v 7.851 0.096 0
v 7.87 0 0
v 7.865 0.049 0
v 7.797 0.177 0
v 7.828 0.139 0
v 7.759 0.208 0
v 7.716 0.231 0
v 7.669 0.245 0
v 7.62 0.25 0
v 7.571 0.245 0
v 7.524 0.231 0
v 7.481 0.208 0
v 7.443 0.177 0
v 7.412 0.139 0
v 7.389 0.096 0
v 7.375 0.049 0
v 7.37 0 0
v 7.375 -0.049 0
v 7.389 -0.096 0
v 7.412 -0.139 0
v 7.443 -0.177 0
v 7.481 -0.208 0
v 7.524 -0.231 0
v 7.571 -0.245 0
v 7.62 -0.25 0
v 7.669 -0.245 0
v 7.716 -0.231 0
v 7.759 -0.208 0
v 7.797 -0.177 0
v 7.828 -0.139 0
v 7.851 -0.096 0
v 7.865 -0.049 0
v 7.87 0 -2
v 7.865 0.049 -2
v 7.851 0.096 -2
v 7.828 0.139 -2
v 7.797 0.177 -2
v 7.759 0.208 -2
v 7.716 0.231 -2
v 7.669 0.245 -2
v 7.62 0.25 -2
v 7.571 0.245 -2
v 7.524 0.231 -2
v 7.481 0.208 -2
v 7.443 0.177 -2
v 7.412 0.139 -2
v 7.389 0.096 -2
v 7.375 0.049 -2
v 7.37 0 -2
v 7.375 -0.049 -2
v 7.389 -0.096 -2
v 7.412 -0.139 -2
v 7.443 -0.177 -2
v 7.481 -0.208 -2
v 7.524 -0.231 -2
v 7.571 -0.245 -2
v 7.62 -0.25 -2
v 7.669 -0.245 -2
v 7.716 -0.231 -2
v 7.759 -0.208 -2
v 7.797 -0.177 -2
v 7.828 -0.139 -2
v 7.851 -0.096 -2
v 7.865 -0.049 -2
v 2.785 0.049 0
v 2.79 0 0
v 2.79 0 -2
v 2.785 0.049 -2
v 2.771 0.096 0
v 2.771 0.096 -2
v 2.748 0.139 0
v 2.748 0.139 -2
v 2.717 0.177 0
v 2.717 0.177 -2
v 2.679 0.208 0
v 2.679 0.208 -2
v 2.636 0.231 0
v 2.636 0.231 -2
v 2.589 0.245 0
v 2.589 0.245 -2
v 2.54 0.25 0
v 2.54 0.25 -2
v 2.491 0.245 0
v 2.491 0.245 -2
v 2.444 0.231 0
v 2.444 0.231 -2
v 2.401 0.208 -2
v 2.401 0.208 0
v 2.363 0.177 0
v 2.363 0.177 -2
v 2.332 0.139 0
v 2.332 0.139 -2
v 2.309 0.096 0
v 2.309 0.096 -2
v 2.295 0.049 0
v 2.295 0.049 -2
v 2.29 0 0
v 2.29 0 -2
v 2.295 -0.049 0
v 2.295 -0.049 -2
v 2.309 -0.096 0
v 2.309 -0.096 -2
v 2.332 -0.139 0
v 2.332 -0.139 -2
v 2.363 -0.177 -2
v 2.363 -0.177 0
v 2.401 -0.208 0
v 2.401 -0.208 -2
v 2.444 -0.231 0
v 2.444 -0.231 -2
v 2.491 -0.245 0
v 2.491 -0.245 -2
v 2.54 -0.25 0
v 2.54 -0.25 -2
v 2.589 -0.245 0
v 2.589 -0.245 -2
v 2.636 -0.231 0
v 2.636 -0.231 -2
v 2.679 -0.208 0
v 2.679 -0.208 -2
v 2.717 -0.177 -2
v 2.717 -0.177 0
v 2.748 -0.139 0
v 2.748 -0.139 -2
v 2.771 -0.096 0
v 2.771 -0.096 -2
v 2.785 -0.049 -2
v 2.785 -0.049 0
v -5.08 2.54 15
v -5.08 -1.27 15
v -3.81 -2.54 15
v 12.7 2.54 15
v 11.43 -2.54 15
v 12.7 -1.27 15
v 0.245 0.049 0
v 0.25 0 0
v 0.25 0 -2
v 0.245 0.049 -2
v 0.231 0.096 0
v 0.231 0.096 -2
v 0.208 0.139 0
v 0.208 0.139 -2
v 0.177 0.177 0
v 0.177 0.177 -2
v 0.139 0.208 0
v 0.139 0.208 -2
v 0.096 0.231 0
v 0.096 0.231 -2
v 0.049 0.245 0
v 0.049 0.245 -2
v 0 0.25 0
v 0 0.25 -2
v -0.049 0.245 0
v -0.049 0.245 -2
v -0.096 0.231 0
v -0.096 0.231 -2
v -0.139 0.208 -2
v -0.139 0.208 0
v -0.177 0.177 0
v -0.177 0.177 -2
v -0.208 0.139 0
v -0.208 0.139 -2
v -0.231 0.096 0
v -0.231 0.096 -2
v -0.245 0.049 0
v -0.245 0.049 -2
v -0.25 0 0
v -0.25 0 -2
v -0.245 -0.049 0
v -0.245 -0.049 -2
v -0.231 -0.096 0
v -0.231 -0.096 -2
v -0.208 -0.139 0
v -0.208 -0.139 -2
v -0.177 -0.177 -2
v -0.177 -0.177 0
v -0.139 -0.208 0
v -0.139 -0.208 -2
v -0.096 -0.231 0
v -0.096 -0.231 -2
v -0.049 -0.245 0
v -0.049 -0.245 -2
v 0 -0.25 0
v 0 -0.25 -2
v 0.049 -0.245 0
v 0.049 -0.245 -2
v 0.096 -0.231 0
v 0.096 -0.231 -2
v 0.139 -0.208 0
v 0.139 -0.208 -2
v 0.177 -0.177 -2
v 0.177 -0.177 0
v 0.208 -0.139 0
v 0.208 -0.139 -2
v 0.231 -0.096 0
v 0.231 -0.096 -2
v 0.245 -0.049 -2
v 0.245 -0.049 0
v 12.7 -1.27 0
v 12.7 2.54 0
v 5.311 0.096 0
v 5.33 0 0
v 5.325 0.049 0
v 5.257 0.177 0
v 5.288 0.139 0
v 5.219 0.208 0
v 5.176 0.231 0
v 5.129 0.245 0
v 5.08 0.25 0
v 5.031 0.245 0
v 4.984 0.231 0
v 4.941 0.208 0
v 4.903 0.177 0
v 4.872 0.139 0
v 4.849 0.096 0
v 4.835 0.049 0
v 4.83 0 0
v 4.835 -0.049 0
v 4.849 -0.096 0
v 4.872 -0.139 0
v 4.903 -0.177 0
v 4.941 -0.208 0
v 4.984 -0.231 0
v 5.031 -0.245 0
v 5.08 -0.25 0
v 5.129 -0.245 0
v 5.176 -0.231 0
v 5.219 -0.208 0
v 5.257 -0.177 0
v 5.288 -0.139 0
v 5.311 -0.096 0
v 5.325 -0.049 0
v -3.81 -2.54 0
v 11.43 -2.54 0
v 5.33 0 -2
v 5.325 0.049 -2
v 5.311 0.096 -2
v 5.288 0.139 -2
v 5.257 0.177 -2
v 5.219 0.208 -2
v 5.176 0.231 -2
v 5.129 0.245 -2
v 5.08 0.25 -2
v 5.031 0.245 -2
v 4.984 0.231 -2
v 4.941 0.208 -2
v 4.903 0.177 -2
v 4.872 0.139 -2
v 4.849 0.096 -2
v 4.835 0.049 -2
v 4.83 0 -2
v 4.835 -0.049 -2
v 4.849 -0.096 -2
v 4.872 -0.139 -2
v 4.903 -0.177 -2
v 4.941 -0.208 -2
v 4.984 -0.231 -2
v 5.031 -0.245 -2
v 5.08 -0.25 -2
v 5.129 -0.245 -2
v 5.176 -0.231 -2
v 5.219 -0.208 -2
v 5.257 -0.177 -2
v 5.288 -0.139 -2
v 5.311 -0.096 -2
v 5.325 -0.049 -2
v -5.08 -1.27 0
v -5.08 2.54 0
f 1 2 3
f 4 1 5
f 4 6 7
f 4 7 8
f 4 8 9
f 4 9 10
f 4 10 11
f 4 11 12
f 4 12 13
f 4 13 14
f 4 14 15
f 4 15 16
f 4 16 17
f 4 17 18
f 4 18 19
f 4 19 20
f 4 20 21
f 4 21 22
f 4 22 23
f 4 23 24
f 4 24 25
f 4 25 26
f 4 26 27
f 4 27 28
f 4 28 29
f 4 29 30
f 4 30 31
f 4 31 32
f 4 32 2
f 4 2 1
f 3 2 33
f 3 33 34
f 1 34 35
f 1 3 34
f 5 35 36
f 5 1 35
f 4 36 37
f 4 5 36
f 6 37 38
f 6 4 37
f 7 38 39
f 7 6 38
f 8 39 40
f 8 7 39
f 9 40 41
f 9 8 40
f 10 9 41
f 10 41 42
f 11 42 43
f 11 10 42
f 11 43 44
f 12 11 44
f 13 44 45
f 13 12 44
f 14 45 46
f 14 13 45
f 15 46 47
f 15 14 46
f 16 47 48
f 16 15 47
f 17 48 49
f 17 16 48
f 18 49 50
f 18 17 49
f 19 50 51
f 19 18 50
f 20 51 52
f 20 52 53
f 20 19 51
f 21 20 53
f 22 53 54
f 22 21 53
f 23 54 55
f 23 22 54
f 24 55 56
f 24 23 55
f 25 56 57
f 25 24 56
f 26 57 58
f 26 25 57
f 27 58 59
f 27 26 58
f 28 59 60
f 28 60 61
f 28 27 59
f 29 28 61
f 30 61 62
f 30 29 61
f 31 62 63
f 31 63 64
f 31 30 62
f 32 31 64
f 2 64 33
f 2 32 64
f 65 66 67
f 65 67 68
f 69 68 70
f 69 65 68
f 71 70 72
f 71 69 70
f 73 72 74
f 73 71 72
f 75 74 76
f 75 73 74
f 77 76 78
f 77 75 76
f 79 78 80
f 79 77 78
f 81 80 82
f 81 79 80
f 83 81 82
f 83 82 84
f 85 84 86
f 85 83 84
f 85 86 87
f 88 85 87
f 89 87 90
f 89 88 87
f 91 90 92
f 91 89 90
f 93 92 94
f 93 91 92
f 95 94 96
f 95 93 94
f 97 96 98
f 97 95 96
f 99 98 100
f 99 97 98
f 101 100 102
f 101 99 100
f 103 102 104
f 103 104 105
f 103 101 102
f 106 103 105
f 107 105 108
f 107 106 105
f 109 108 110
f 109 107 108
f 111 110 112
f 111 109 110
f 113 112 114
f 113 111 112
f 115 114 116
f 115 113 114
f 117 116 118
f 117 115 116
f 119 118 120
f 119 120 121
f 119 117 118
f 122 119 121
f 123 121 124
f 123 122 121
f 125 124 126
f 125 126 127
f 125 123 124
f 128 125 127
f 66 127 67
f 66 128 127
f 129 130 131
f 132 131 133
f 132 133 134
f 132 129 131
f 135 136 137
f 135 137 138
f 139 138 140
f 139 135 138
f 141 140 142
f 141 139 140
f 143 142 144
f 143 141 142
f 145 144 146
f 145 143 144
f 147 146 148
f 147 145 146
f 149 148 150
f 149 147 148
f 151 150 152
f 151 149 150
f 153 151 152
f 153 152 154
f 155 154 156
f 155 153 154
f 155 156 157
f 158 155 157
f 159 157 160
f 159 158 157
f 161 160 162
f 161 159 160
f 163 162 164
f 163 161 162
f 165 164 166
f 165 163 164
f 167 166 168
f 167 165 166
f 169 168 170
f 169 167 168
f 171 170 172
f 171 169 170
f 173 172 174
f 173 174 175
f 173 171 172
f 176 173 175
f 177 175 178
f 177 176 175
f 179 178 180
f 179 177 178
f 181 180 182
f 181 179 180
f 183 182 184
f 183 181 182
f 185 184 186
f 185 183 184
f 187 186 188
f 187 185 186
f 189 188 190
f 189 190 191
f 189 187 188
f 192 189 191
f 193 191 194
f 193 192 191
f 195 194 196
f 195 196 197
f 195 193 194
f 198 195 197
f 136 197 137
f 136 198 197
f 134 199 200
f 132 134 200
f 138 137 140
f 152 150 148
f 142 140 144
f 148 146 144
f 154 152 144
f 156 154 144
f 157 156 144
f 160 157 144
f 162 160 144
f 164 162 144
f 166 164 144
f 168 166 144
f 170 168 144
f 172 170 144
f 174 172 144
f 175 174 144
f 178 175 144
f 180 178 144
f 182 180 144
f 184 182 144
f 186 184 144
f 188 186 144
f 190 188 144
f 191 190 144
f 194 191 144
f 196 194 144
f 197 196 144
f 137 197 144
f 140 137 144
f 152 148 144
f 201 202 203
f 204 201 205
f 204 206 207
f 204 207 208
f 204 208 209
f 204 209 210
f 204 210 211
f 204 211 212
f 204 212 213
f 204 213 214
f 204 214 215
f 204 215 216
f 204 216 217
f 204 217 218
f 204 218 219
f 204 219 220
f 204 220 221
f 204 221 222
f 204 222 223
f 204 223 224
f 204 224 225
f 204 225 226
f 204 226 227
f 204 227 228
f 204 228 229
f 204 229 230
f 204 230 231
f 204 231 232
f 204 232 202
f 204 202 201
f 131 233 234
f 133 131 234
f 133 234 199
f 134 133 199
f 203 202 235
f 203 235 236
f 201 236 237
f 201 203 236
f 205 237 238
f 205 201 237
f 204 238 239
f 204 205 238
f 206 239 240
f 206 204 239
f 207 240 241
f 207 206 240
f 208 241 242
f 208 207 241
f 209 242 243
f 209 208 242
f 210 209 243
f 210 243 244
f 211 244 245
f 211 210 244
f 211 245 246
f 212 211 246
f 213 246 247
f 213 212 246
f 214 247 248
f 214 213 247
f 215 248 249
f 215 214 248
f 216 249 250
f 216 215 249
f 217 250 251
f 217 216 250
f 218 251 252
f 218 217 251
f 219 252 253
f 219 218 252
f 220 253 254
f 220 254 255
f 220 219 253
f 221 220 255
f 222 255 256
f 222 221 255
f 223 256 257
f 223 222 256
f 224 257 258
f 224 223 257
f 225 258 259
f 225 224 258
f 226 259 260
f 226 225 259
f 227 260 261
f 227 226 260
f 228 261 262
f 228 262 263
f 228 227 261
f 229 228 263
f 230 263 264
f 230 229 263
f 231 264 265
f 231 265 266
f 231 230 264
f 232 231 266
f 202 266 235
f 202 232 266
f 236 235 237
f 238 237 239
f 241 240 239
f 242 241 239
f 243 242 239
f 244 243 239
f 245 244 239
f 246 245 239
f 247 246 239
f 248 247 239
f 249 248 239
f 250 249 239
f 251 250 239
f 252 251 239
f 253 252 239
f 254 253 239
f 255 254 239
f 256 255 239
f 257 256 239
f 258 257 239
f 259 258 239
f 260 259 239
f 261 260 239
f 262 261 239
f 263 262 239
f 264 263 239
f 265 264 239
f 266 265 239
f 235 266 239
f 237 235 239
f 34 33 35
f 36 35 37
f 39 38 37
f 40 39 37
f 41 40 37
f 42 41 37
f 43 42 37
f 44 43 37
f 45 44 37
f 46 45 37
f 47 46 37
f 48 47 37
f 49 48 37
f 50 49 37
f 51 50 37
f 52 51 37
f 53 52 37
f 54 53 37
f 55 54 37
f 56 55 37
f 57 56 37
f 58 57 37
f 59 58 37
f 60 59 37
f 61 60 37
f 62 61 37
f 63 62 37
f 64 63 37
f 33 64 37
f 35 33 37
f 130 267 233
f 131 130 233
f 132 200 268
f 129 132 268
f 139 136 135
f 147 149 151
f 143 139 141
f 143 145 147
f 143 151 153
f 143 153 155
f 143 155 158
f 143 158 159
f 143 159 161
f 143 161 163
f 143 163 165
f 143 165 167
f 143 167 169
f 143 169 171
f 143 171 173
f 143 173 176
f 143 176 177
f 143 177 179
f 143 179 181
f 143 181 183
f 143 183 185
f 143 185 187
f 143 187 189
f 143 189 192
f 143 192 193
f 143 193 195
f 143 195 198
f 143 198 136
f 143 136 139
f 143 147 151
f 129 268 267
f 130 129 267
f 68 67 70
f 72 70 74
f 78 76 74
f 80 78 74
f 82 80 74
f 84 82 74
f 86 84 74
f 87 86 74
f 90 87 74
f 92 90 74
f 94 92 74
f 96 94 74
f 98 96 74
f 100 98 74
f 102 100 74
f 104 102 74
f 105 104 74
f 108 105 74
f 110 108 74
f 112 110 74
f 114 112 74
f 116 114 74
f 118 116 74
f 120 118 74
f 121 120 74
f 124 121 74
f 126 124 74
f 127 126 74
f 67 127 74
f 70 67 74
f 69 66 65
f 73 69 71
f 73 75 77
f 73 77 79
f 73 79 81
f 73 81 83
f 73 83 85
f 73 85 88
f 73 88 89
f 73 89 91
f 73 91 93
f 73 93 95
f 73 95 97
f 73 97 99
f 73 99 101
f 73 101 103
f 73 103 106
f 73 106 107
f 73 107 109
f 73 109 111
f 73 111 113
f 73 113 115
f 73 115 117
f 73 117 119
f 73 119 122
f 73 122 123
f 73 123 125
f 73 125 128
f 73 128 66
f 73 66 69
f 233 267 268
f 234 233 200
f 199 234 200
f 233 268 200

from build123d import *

# Parameters (mm, degrees)
COMPONENT_OUTLINE_DEPTH = 15
SKETCH2_R               = 0.25
EXTRUDE_1_DEPTH         = 2
SKETCH3_R               = 0.25
EXTRUDE_2_DEPTH         = 2
SKETCH4_R               = 0.25
EXTRUDE_3_DEPTH         = 2
SKETCH5_R               = 0.25
EXTRUDE_4_DEPTH         = 2


with BuildPart() as part:
    # Sketch1 → Component_Outline (new body)
    with BuildSketch(Plane.XY):
        Polygon((-5.08, 2.54), (-5.08, -1.27), (-3.81, -2.54), (11.43, -2.54), (12.7, -1.27), (12.7, 2.54), align=None)
    extrude(amount=COMPONENT_OUTLINE_DEPTH)


with BuildPart() as body_2:
    # Sketch2 → Extrude 1 (new body)
    with BuildSketch(Plane.XY):
        Circle(SKETCH2_R)
    extrude(amount=-EXTRUDE_1_DEPTH)


with BuildPart() as body_3:
    # Sketch3 → Extrude 2 (new body)
    with BuildSketch(Plane.XY):
        with Locations((2.54, 0)):
            Circle(SKETCH3_R)
    extrude(amount=-EXTRUDE_2_DEPTH)


with BuildPart() as body_4:
    # Sketch4 → Extrude 3 (new body)
    with BuildSketch(Plane.XY):
        with Locations((5.08, 0)):
            Circle(SKETCH4_R)
    extrude(amount=-EXTRUDE_3_DEPTH)


with BuildPart() as body_5:
    # Sketch5 → Extrude 4 (new body)
    with BuildSketch(Plane.XY):
        with Locations((7.62, 0)):
            Circle(SKETCH5_R)
    extrude(amount=-EXTRUDE_4_DEPTH)


solid = Compound([part.part, body_2.part, body_3.part, body_4.part, body_5.part])
